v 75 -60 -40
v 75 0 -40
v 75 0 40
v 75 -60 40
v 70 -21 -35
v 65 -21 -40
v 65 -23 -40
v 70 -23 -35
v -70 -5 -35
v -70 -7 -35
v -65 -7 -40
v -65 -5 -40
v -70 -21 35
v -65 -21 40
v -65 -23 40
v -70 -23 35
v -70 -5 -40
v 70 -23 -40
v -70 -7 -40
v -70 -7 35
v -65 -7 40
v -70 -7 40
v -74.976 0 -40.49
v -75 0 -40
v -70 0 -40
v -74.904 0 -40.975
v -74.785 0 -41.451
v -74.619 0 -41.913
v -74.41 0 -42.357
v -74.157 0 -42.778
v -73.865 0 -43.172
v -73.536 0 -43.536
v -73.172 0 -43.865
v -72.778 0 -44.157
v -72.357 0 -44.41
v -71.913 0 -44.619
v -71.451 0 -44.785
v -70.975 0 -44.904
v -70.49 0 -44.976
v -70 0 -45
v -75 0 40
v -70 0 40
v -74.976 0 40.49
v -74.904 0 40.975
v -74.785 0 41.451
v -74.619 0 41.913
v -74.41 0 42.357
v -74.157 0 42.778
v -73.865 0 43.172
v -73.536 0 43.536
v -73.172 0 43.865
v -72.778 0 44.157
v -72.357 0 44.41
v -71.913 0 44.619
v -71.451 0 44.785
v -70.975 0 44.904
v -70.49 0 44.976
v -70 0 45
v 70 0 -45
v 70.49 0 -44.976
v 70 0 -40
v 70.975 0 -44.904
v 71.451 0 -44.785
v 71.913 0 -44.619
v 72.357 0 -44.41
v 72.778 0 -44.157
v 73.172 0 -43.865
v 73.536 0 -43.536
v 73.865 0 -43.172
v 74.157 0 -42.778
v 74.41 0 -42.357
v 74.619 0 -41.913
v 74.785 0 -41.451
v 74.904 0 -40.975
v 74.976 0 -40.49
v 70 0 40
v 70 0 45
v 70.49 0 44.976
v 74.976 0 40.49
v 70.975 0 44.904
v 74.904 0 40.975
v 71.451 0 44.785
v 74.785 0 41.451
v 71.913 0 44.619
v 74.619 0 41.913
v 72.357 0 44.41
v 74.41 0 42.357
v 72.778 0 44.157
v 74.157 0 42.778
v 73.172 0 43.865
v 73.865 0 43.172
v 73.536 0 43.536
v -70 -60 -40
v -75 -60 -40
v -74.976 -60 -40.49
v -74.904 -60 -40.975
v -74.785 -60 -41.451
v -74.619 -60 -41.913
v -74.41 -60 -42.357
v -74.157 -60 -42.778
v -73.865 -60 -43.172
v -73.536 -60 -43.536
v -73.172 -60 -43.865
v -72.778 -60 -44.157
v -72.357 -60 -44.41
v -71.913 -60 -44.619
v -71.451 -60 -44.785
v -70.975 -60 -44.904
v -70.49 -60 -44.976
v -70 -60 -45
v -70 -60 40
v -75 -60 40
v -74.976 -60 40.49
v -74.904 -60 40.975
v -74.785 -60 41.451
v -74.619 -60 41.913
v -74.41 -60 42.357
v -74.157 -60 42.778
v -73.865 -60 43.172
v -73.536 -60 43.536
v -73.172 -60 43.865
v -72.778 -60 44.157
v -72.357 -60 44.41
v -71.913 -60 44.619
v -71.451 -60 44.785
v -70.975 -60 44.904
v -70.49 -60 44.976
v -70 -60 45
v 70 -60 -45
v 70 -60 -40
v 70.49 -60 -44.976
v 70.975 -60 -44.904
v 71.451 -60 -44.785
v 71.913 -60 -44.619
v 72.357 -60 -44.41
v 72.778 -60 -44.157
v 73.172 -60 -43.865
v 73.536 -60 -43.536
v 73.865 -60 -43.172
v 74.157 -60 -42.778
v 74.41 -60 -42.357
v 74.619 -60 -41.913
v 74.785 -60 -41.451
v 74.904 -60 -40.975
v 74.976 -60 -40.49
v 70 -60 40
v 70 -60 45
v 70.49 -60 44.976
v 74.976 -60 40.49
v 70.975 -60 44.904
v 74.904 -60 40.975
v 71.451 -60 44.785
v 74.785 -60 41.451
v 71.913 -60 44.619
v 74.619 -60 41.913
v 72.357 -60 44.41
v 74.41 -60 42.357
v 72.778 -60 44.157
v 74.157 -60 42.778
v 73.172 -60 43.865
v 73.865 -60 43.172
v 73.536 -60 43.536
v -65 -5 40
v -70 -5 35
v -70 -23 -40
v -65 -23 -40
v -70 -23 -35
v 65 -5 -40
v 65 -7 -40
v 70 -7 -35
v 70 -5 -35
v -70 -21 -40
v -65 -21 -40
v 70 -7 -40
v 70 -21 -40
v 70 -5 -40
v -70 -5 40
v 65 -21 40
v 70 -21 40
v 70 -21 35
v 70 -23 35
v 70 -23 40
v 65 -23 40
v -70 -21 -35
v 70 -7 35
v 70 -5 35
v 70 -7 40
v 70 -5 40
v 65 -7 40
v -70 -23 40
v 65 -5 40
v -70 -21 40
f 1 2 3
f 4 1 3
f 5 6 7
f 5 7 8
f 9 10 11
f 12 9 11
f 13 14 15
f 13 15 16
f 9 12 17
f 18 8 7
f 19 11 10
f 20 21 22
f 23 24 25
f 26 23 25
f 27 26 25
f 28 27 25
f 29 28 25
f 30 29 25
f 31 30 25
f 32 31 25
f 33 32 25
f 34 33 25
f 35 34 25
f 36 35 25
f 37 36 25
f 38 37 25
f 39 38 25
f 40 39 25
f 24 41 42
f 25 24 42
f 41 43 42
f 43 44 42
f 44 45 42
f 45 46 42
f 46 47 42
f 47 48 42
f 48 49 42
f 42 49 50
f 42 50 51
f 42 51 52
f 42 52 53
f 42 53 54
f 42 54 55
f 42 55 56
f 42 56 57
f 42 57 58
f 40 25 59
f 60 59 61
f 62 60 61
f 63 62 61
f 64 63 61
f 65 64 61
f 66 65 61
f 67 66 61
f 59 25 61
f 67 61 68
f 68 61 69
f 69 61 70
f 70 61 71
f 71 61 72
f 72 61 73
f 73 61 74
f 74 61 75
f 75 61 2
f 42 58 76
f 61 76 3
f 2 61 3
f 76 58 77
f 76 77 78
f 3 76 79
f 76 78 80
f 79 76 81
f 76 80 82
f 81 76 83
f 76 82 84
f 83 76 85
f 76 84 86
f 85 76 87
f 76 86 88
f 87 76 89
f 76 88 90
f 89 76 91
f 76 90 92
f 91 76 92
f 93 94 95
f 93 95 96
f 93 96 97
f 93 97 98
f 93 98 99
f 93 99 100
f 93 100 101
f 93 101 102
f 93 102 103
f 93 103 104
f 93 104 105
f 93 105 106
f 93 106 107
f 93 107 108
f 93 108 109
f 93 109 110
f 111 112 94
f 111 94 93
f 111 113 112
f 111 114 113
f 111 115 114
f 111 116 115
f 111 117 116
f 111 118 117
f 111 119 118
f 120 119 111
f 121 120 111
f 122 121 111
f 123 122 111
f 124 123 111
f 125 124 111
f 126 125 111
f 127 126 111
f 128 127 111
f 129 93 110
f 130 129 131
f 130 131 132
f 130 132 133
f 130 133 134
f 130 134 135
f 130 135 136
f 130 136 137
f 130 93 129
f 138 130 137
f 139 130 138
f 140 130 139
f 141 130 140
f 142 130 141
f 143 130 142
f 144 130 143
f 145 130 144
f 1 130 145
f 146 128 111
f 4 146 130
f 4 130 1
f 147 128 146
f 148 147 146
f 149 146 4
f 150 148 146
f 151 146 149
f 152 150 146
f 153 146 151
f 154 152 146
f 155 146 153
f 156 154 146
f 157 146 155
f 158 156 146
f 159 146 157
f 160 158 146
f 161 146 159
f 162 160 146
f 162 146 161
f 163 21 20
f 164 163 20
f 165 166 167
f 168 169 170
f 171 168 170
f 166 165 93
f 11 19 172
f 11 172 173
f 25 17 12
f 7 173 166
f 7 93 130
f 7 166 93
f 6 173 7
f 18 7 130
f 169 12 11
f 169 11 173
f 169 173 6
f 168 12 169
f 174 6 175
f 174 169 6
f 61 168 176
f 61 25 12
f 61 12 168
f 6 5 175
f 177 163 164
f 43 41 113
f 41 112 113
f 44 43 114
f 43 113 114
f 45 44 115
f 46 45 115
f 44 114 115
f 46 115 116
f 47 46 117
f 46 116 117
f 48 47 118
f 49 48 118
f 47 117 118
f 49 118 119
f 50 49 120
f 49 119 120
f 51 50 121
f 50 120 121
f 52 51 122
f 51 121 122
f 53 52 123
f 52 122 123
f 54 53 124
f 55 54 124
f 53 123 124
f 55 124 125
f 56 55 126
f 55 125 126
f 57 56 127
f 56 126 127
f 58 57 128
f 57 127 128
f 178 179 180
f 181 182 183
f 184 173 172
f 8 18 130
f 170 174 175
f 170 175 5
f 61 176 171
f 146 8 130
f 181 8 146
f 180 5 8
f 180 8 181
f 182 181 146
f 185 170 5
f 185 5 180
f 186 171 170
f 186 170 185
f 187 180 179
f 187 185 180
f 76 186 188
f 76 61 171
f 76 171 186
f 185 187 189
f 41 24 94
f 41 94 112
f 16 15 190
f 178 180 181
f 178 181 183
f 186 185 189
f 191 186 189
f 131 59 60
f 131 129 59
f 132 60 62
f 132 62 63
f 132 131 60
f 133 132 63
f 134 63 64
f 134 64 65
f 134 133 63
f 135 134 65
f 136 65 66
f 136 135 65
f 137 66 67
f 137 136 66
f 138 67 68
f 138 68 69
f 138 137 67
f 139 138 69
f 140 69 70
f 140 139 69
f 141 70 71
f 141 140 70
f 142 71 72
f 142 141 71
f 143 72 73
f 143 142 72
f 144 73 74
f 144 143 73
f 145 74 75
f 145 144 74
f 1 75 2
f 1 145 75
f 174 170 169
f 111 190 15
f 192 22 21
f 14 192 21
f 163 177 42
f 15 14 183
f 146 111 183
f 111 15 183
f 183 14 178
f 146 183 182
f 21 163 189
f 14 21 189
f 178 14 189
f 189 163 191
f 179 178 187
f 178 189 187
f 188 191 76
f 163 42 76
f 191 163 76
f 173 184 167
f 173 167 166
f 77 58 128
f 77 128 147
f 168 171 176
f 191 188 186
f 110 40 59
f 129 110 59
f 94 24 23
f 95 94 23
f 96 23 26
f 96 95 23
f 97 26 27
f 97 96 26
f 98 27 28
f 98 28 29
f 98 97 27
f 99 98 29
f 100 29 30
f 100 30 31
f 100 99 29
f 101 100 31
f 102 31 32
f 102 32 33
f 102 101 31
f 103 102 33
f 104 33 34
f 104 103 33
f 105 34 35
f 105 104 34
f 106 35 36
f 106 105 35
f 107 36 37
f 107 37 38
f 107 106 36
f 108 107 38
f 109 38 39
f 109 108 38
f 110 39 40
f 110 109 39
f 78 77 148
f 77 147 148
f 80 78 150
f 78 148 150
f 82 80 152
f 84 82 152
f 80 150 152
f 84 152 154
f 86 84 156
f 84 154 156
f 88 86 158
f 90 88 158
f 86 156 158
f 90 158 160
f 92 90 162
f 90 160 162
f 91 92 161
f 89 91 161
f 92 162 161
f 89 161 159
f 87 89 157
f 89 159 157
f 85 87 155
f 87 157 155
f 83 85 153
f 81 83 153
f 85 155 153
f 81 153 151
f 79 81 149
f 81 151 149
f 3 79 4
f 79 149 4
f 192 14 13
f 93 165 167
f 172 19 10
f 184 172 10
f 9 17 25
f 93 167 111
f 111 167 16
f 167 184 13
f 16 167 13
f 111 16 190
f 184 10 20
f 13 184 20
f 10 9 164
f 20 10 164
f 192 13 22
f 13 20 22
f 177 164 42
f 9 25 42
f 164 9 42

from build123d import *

# Parameters (mm, degrees)
F0_W     = 1500
F0_H     = 900
F0_W_2   = 1400
F0_H_2   = 800
F1_DEPTH = 600
F2_SCALE = 0.1
F6_DEPTH = 2
F7_R     = 5


# Not quite as in the source:
# - a pattern or mirror of a feature is missing from the dataset's text; its kind, count and spacing are read off the source's solid


with BuildPart() as f1:
    # F0 (on Front) → F1 (new body)
    with BuildSketch(Plane.XZ):
        Rectangle(F0_W, F0_H)
        Rectangle(F0_W_2, F0_H_2, mode=Mode.SUBTRACT)
    extrude(amount=F1_DEPTH)


with BuildPart() as f1_1:
    # F2: moved
    add(f1.part.scale(F2_SCALE))

    # F5 (on offset) → F6 (join)
    with BuildSketch(Plane(origin=(0, -21, 0), x_dir=(-1, 0, 0), z_dir=(0, 1, 0))):
        Polygon((-65, 40), (-70, 40), (-70, 35), align=None)
        Polygon((65, 40), (70, 35), (70, 40), align=None)
        Polygon((-70, -35), (-70, -40), (-65, -40), align=None)
        Polygon((65, -40), (70, -40), (70, -35), align=None)
    f6 = extrude(amount=-F6_DEPTH)

    # F6_copies: F6 across plane
    add(f6.mirror(Plane.ZX.offset(-14)))

    # F7
    f7_edges = [f1_1.edges().sort_by_distance(p)[0] for p in [
        (75, -30, 45),
        (75, -30, -45),
        (-75, -30, -45),
        (-75, -30, 45),
    ]]
    fillet(f7_edges, radius=F7_R)


solid = f1_1.part
